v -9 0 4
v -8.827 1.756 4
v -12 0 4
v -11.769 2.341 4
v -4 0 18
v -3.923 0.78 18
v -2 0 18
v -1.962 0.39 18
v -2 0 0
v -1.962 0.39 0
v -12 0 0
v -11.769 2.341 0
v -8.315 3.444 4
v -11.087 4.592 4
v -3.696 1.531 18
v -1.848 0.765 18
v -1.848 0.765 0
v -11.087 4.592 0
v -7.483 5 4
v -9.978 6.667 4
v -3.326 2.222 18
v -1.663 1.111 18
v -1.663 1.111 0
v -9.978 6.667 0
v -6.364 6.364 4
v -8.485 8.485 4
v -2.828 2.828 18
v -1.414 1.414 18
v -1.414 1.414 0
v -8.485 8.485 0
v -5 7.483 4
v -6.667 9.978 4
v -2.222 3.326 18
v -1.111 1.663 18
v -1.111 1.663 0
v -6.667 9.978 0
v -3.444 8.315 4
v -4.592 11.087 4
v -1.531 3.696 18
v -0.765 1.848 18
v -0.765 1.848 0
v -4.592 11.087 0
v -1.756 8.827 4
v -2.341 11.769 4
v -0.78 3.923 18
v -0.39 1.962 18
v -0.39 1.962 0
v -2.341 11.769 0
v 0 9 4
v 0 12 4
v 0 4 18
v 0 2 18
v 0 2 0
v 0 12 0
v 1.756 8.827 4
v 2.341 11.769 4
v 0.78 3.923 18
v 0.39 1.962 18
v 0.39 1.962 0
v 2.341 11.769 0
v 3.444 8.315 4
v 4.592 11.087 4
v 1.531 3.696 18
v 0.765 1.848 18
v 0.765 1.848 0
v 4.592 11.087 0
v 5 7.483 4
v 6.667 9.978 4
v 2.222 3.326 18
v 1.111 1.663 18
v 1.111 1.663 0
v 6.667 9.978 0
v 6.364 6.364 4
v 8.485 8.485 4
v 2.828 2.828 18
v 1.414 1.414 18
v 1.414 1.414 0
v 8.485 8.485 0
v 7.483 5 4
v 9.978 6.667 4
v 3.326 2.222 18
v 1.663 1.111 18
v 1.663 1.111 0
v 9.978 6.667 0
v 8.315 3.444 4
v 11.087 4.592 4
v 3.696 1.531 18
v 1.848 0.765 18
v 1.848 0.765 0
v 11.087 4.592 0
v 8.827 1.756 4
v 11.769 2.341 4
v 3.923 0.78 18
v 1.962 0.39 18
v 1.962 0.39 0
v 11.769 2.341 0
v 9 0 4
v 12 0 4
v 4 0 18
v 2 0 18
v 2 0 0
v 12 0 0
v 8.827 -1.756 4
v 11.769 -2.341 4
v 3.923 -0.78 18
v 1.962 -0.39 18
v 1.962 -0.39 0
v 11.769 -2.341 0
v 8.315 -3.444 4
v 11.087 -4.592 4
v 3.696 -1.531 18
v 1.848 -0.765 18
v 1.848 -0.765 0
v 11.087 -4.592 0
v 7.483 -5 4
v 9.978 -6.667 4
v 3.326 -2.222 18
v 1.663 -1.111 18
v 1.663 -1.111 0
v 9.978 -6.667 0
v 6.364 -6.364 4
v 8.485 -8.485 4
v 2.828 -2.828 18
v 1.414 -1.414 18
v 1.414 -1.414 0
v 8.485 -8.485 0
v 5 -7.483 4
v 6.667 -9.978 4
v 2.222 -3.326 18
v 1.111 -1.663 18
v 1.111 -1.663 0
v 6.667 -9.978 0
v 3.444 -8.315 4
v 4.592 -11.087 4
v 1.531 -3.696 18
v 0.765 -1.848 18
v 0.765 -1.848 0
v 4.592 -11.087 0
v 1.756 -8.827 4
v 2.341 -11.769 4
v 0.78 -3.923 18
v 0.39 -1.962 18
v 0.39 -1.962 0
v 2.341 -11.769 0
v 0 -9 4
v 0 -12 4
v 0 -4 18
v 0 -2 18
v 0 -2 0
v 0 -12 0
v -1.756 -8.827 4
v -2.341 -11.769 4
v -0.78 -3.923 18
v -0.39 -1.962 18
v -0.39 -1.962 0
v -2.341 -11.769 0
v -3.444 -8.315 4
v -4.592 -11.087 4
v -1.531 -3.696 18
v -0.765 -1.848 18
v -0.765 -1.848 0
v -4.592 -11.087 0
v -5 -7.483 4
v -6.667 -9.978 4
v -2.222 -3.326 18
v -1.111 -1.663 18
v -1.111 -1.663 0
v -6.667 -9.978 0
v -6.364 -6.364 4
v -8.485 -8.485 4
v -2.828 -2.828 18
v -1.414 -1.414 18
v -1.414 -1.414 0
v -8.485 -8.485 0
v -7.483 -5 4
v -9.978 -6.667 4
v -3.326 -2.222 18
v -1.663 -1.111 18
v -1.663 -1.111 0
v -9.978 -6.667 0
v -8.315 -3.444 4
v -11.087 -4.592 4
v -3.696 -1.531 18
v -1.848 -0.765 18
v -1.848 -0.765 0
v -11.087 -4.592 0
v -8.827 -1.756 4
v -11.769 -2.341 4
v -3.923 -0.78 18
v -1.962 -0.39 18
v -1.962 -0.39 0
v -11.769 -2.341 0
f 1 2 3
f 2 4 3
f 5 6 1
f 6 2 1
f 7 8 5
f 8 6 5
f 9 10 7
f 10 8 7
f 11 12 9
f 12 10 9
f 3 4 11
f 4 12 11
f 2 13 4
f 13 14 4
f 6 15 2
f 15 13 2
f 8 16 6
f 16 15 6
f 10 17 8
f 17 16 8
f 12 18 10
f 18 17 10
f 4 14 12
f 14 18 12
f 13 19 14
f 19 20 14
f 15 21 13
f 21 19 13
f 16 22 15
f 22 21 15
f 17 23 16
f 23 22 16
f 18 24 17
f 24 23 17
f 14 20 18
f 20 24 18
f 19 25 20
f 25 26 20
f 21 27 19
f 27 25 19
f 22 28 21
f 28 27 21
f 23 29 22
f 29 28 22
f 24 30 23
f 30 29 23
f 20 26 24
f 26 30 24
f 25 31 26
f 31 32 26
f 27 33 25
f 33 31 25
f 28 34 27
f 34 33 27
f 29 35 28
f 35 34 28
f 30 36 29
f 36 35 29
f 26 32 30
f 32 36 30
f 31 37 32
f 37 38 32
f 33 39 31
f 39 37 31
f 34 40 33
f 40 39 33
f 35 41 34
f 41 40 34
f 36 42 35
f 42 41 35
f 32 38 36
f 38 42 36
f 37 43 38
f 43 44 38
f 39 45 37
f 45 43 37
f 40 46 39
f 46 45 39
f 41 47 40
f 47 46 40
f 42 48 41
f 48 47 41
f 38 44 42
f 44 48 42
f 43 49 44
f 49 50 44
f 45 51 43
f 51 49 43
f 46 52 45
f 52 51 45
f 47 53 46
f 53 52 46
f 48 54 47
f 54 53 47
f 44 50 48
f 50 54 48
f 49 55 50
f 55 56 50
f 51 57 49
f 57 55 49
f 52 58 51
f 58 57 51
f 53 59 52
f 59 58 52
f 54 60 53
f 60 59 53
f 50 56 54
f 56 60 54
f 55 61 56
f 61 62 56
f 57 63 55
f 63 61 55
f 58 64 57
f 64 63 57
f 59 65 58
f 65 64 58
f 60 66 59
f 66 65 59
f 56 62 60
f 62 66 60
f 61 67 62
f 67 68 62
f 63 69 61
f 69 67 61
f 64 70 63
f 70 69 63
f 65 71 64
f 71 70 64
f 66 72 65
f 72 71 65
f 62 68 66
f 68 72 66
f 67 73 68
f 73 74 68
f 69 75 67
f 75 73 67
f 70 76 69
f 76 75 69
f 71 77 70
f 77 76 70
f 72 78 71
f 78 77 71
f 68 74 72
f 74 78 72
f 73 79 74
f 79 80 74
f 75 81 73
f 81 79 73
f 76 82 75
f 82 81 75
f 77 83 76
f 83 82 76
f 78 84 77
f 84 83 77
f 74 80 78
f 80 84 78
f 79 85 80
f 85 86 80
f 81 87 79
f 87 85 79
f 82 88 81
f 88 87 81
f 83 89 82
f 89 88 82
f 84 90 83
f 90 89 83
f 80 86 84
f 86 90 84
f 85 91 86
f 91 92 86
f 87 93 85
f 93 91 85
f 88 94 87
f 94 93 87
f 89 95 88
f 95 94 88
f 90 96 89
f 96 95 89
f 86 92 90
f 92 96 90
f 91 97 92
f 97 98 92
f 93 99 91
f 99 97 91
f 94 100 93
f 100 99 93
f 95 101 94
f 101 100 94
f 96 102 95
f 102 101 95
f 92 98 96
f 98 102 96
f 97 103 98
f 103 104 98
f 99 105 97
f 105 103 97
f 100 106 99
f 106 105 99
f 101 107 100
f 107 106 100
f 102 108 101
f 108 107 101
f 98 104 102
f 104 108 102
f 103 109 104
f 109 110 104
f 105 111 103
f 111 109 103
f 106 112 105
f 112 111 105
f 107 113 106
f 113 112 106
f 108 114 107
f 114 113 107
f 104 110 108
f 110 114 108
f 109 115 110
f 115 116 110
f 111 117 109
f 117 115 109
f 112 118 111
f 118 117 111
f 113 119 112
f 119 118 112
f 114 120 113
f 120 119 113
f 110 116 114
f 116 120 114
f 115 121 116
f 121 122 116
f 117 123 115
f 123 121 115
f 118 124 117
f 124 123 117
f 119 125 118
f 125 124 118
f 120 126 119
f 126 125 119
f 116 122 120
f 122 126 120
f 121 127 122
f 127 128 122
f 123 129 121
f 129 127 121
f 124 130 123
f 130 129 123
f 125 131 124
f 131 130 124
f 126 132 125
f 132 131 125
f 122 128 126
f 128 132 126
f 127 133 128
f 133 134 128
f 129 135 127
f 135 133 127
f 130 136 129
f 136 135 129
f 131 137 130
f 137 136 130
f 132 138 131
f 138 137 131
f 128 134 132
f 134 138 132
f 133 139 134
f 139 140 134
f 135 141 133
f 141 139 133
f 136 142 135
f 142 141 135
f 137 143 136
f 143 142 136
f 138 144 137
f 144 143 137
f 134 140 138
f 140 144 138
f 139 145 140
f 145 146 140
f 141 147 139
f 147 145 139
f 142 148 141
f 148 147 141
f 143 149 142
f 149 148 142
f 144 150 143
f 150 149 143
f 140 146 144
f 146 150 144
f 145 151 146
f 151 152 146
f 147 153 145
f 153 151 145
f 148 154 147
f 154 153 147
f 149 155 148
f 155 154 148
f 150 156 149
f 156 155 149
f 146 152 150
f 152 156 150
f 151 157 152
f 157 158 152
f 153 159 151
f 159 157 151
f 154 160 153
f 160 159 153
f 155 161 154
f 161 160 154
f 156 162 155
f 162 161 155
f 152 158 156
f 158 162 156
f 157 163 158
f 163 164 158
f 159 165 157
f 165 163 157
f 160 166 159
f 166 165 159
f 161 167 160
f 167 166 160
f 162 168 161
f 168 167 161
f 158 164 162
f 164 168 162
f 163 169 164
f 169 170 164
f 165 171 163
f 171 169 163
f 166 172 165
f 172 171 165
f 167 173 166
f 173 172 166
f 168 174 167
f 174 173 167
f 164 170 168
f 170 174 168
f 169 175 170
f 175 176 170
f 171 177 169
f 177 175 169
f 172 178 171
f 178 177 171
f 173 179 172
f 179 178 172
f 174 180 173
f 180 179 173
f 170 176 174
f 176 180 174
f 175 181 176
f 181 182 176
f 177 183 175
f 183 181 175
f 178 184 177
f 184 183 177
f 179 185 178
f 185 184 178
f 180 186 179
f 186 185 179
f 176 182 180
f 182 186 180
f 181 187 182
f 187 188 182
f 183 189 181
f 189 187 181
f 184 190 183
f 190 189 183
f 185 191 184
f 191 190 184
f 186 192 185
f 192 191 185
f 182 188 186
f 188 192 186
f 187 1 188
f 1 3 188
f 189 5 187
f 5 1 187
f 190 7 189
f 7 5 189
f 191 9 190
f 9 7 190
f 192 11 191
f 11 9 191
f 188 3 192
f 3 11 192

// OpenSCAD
$fn = 32;

// ----------------------------------------------------------------------
// Profiled standoff: conical spacer, 18 mm long, bore 4 mm
// ----------------------------------------------------------------------

// --- parameters (mm) ---
revolve_angle = 360;      // full turn around the Z axis
profile_points = 6;       // points of the closed outline

profile = [[2, 0], [12, 0], [12, 4], [9, 4], [4, 18], [2, 18]];  // single closed polygon, 6 points, counter clockwise

// --- the one profile operation ---
rotate_extrude(angle = revolve_angle) polygon(points = profile);
